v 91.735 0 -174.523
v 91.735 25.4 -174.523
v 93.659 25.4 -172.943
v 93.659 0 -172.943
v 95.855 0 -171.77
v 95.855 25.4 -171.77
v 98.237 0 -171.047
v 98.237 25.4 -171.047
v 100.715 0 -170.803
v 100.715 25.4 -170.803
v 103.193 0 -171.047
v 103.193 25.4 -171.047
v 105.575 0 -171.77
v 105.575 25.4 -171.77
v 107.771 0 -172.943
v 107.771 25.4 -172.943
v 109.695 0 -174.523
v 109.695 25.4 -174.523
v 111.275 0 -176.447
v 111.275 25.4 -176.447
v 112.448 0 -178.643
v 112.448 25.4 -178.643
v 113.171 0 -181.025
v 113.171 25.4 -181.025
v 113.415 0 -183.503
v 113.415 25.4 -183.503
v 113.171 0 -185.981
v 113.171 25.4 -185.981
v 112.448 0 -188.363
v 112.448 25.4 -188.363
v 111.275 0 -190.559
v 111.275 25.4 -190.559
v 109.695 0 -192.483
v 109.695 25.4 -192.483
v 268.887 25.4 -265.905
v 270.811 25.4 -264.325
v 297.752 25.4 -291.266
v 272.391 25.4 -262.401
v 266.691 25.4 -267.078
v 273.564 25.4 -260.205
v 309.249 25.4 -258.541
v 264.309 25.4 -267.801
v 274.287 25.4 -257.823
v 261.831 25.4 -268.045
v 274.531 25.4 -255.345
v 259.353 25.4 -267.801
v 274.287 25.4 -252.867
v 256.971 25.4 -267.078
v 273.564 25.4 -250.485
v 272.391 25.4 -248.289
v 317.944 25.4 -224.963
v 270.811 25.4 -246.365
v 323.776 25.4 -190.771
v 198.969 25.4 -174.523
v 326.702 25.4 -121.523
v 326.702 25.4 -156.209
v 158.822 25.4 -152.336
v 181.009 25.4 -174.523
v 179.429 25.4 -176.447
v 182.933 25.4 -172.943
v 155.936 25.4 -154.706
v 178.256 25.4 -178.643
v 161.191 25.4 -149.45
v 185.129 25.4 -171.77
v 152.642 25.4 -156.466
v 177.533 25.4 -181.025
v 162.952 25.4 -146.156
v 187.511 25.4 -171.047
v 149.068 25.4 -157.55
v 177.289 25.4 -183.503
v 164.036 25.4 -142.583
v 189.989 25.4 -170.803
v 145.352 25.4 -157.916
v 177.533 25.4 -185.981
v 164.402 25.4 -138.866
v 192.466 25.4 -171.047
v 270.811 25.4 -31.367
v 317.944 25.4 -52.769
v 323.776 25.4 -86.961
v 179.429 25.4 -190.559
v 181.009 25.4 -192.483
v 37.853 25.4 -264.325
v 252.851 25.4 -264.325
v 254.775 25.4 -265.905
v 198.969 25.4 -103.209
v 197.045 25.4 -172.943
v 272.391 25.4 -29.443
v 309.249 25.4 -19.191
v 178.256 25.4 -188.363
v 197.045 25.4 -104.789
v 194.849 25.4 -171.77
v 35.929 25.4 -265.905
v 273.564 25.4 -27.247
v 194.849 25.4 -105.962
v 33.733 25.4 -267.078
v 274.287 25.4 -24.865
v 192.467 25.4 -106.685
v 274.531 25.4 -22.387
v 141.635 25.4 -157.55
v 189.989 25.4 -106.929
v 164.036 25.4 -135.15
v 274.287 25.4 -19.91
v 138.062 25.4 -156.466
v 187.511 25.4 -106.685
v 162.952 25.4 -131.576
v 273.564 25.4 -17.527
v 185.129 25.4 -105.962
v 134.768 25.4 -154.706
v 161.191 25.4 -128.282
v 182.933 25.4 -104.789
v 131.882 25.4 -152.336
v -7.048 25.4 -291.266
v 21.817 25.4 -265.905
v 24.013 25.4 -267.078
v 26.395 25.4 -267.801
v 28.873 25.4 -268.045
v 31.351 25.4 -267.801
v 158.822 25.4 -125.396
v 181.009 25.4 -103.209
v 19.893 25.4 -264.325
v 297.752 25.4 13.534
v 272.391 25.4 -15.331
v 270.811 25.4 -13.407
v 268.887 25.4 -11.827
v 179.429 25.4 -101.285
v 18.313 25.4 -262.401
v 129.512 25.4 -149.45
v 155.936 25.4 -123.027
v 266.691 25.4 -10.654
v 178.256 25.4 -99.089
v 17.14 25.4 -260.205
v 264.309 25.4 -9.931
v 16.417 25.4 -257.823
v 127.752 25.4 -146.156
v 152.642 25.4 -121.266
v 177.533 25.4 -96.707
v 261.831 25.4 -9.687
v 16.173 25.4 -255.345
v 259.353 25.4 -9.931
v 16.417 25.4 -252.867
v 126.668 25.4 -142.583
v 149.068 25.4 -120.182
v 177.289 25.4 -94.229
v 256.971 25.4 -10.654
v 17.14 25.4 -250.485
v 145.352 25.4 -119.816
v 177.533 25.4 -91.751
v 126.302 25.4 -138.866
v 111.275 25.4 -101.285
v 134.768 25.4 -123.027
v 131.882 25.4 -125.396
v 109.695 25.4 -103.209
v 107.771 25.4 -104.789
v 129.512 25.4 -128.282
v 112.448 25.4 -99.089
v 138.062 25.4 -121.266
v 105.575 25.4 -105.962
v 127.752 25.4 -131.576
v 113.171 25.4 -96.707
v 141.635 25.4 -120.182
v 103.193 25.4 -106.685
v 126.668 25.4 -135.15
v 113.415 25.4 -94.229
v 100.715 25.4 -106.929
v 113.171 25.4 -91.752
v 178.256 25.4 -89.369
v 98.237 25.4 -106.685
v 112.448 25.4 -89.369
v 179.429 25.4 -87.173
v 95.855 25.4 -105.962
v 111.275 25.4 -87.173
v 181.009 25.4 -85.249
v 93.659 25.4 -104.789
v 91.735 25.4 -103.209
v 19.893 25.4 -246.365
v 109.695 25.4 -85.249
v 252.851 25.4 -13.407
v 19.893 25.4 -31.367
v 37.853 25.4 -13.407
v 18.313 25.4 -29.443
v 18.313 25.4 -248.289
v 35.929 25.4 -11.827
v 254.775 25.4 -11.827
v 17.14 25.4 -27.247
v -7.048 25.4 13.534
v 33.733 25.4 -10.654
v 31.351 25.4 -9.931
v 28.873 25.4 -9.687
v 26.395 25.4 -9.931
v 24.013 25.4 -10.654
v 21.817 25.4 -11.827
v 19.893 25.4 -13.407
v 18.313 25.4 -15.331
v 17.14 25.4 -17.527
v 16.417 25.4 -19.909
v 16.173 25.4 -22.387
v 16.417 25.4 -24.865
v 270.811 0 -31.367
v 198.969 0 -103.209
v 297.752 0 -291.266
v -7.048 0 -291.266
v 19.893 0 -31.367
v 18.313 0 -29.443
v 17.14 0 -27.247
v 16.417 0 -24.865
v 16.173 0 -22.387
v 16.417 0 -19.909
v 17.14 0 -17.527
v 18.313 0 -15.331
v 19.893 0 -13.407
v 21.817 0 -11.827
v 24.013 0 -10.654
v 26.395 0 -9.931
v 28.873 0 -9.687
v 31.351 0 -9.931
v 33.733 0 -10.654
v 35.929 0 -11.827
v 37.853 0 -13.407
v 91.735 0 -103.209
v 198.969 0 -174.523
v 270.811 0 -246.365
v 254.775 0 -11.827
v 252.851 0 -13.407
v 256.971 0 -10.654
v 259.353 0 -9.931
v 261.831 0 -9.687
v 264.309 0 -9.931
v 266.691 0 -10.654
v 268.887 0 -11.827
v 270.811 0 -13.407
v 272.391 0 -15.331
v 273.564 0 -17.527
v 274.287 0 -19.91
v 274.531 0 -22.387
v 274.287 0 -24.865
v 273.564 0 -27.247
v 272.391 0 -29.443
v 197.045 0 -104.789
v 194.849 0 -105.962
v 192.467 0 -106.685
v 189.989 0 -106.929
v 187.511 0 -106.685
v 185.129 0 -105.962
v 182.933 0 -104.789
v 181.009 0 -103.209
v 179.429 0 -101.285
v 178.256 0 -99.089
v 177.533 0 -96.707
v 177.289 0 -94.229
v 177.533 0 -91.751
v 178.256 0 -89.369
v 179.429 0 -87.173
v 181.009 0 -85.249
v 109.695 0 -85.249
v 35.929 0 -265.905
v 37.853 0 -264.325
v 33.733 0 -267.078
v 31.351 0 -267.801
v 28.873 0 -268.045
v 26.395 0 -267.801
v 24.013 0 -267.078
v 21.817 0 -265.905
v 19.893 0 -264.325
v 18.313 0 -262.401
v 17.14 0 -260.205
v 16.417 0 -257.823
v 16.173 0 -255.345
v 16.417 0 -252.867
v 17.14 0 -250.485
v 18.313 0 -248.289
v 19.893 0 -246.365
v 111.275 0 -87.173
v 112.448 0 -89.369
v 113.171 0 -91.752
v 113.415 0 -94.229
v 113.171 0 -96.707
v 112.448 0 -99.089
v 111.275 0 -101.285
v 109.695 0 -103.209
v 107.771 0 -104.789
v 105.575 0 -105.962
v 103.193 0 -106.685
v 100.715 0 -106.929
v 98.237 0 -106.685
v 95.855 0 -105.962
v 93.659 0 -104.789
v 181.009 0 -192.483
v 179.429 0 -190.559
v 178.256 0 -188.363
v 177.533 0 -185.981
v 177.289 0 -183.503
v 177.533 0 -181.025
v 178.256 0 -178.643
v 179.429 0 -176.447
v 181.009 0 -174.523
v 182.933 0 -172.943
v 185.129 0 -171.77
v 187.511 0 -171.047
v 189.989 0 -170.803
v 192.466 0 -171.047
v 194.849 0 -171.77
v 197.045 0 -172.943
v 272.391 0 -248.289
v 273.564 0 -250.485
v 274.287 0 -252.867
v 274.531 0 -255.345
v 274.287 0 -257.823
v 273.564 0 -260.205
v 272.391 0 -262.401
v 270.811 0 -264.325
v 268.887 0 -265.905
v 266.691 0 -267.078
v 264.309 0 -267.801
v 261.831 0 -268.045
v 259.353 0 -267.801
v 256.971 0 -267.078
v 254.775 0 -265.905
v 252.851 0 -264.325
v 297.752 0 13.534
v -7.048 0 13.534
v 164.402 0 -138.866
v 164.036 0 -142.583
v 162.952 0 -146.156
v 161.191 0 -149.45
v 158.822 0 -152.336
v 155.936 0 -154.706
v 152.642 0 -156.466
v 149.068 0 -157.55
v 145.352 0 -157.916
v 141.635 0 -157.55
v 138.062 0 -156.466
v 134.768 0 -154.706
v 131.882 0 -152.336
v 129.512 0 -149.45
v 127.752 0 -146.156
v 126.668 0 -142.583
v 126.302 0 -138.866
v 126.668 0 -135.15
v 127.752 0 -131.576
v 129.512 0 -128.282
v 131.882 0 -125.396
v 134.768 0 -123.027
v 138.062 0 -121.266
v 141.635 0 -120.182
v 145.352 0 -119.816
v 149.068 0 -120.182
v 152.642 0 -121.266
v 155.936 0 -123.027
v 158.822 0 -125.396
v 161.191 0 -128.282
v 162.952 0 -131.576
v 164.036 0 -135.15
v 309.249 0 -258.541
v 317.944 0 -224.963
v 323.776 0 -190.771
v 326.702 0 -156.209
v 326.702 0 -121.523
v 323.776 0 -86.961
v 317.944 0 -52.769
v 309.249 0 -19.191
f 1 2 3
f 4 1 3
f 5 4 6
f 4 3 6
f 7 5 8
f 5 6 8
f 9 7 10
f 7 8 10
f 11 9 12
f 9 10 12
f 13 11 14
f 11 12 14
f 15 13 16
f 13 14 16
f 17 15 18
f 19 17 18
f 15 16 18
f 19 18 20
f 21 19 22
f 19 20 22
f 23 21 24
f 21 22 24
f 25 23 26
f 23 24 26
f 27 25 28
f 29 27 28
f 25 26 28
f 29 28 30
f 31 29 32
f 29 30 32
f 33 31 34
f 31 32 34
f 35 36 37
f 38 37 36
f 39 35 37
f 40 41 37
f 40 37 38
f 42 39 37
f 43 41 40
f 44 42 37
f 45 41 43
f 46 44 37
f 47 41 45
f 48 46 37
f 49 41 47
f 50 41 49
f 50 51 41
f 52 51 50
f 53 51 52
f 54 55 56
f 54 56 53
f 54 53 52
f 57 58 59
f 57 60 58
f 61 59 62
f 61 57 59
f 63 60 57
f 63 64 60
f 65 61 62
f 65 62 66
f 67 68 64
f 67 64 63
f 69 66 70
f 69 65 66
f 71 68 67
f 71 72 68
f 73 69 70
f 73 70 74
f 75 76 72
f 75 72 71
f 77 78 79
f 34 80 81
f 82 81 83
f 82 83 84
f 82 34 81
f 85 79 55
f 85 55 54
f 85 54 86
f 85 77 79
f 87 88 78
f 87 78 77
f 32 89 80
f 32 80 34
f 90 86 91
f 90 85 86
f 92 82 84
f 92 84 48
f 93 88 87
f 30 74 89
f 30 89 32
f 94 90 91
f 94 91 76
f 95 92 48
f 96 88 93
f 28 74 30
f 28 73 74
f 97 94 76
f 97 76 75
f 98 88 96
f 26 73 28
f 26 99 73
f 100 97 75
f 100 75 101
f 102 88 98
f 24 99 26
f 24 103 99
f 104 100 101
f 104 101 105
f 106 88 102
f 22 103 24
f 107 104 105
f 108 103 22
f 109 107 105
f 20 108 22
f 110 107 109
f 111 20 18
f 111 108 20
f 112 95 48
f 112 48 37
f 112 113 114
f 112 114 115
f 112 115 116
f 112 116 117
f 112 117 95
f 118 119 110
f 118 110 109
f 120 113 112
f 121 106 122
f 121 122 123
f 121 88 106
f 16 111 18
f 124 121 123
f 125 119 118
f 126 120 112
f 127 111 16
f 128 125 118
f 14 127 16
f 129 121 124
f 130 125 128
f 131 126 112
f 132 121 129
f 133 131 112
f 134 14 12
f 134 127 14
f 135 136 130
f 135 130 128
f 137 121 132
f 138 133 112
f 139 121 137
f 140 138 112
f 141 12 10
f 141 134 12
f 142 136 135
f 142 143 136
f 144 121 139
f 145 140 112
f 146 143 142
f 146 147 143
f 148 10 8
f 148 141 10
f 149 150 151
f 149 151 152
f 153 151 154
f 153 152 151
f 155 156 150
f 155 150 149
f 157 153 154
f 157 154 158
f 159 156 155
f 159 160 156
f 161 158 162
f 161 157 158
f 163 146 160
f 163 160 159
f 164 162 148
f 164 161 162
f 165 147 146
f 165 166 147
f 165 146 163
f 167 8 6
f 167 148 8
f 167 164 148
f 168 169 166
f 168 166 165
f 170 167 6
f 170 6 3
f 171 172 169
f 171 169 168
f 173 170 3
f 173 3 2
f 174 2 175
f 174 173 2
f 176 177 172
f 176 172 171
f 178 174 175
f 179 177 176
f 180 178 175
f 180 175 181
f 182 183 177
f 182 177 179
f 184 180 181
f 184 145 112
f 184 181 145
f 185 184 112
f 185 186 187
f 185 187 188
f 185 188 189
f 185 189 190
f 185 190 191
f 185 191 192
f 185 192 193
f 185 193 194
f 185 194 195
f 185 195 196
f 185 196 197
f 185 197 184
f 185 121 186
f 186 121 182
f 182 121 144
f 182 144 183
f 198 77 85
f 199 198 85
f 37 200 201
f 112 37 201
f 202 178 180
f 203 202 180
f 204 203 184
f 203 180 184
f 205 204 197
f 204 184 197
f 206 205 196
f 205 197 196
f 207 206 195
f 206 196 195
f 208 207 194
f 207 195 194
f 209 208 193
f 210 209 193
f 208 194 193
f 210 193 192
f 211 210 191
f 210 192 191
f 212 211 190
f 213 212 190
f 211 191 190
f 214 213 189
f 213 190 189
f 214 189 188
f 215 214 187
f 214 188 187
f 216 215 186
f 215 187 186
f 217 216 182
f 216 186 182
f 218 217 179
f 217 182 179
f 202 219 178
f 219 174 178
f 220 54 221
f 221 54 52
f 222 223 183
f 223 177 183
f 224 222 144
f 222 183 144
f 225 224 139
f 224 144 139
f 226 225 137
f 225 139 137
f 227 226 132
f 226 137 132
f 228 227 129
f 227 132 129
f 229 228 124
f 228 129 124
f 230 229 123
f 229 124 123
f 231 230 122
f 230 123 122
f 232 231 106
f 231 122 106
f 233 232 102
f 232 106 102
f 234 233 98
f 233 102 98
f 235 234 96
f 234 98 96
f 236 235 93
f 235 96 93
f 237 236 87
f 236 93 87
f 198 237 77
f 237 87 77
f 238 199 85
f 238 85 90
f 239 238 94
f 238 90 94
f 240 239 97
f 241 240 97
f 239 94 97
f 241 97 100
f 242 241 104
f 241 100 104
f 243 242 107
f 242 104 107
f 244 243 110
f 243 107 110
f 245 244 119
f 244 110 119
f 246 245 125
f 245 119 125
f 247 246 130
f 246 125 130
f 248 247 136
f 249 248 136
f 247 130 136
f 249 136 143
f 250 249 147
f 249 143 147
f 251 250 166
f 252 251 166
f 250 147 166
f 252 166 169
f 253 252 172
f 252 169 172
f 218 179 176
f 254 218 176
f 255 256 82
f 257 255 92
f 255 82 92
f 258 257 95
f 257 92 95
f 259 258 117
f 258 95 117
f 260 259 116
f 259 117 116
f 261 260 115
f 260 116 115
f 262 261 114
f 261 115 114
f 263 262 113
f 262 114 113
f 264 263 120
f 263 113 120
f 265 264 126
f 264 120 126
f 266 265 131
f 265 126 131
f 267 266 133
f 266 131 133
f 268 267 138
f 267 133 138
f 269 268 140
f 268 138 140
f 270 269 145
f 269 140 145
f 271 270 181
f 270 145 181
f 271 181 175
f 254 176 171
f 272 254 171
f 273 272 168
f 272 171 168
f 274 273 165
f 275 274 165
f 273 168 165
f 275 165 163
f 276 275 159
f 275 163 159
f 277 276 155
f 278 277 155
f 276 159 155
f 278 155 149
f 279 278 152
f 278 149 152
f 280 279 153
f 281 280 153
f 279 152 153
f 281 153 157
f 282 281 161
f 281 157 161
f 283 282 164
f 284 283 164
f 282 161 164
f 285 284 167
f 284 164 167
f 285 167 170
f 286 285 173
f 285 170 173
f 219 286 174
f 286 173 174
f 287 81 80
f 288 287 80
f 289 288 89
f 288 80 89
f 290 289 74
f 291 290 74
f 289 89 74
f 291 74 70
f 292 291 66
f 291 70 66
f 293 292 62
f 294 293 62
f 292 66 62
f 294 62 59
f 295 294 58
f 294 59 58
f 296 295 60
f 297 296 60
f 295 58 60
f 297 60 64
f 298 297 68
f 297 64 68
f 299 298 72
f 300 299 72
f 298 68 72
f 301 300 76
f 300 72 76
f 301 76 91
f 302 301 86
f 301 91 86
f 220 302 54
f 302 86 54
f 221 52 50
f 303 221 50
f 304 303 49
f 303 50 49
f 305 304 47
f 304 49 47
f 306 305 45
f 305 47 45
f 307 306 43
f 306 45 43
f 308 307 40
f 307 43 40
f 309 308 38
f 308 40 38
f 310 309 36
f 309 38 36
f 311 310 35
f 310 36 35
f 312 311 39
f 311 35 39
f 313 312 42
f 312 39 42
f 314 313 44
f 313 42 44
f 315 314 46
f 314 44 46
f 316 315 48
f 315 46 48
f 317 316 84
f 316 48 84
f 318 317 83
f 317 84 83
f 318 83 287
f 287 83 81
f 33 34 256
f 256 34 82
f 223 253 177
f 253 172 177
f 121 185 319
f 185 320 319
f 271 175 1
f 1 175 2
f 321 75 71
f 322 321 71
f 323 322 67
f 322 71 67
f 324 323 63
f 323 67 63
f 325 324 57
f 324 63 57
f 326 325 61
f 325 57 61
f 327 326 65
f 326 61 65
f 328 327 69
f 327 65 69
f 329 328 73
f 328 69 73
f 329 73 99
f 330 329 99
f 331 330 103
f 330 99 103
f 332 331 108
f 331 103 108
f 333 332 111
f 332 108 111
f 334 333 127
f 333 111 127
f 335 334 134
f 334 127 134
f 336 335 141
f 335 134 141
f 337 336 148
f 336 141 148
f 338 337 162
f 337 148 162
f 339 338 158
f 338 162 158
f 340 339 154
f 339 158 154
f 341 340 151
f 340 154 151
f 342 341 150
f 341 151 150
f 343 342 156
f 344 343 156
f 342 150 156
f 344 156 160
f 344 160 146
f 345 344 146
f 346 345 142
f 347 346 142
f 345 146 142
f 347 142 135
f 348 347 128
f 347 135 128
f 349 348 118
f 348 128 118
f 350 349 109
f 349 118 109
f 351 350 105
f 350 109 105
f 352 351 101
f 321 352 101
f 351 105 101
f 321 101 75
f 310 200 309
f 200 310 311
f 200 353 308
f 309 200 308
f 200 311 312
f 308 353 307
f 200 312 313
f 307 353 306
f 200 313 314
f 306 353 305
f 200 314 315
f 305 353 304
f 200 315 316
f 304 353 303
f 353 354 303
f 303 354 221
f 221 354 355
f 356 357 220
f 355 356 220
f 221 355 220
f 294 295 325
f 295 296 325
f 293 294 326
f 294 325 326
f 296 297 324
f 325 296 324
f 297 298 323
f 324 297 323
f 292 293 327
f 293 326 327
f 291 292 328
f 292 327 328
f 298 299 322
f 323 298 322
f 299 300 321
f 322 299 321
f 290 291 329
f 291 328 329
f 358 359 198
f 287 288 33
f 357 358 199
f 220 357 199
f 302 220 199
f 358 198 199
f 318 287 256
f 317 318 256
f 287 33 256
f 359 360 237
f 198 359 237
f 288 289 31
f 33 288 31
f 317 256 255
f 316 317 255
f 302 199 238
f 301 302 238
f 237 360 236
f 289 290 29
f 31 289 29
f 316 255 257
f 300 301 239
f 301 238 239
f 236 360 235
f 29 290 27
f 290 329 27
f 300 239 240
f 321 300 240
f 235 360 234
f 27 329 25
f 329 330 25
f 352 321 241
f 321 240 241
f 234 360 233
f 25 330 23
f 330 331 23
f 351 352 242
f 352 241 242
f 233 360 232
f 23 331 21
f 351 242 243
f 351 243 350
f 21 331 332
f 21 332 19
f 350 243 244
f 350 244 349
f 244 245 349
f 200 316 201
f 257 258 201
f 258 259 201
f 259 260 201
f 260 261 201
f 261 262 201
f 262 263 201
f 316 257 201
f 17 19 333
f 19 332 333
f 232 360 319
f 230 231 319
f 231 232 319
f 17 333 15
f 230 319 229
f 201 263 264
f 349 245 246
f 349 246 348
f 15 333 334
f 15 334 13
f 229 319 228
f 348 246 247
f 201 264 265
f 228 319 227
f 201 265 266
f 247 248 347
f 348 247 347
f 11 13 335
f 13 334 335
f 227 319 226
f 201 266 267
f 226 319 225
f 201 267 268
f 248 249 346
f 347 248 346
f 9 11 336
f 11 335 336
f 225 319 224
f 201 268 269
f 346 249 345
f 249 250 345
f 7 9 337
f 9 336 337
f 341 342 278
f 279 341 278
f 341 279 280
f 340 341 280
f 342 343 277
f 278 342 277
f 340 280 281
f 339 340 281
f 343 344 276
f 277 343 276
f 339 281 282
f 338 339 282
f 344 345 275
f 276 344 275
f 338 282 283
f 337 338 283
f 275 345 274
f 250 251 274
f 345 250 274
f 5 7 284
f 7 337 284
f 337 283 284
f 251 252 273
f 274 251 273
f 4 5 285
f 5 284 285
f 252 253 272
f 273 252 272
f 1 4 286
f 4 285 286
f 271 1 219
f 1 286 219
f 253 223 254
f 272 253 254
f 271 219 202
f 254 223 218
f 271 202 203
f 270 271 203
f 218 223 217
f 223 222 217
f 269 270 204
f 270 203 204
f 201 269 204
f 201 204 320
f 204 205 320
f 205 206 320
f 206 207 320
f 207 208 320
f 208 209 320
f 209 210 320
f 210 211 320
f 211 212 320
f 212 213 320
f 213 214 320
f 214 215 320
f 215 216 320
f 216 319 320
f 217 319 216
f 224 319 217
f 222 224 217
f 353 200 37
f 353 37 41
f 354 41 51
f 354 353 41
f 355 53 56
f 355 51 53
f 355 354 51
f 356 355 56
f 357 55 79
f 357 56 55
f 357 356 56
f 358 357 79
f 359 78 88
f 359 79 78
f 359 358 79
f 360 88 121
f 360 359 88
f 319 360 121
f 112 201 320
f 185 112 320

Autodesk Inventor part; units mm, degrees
ref_plane "YZ Plane" through (0, 0, 0) normal (1, 0, 0) x (0, 1, 0)
ref_plane "XZ Plane" through (0, 0, 0) normal (0, 1, 0) x (-1, 0, 0)
ref_plane "XY Plane" through (0, 0, 0) normal (0, 0, 1) x (1, 0, 0)
sketch "Sketch1" plane through (0, 0, 0) normal (0, 1, 0) x (-1, 0, 0)
  line L0 (7.0481, 13.5339) -> (-297.7519, 13.5339)
  line L1 (-297.7519, 13.5339) -> (-297.7519, -291.2661)
  line L2 (-297.7519, -291.2661) -> (7.0481, -291.2661)
  line L3 (7.0481, -291.2661) -> (7.0481, 13.5339)
  arc A0 (-297.7519, 13.5339) -> (-297.7519, -291.2661) centre (83.7145, -138.8661) ccw
  point P0 (0, 0)
  dimension "d0" = 304.8
  dimension "d1" = 304.8
extrude "Extrusion1" add sketch "Sketch1" along normal blind 25.4
sketch "Sketch2" plane through (0, 25.4, 0) normal (0, 1, 0) x (1, 0, 0)
  line L0 (-7.0481, 291.2661) -> (-7.0481, -13.5339) projected
  line L1 (-7.0481, 138.8661) -> (145.3519, 138.8661)
  circle A0 centre (145.3519, 138.8661) radius 19.05
  point P0 (0, 0)
  dimension "d4" = 152.4
  dimension "d5" = 38.1
extrude "Extrusion2" cut sketch "Sketch2" against normal blind 50.8
sketch "Sketch3" plane through (0, 25.4, 0) normal (0, 1, 0) x (1, 0, 0)
  line L0 (-7.0481, 291.2661) -> (-7.0481, -13.5339) projected
  line L1 (297.7519, 291.2661) -> (-7.0481, 291.2661) projected
  line L2 (-7.0481, -13.5339) -> (297.7519, 291.2661)
  line L3 (-7.0481, -13.5339) -> (297.7519, -13.5339) projected
  line L4 (-7.0481, 291.2661) -> (297.7519, -13.5339)
  line L5 (-7.0481, -13.5339) -> (28.873, 22.3871)
  line L6 (297.7519, -13.5339) -> (261.8309, 22.3871)
  line L7 (297.7519, 291.2661) -> (261.8309, 255.3451)
  line L8 (-7.0481, 291.2661) -> (28.873, 255.3451)
  line L9 (28.873, 22.3871) -> (261.8309, 22.3871)
  line L10 (261.8309, 22.3871) -> (261.8309, 255.3451)
  line L11 (261.8309, 255.3451) -> (28.873, 255.3451)
  line L12 (28.873, 255.3451) -> (28.873, 22.3871)
  line L13 (28.873, 22.3871) -> (100.715, 94.2292) construction
  line L14 (37.8532, 13.4068) -> (109.6953, 85.2489)
  line L15 (91.7348, 103.2094) -> (19.8927, 31.3674)
  arc A0 (19.8927, 31.3674) -> (37.8532, 13.4068) centre (28.873, 22.3871) ccw
  arc A1 (109.6953, 85.2489) -> (91.7348, 103.2094) centre (100.715, 94.2292) ccw
  line L16 (28.873, 255.3451) -> (100.715, 183.503) construction
  line L17 (19.8927, 246.3648) -> (91.7348, 174.5228)
  line L18 (109.6953, 192.4833) -> (37.8532, 264.3253)
  arc A2 (37.8532, 264.3253) -> (19.8927, 246.3648) centre (28.873, 255.3451) ccw
  arc A3 (91.7348, 174.5228) -> (109.6953, 192.4833) centre (100.715, 183.503) ccw
  line L19 (261.8309, 22.3871) -> (189.9889, 94.2292) construction
  line L20 (270.8112, 31.3674) -> (198.9691, 103.2094)
  line L21 (181.0086, 85.2489) -> (252.8507, 13.4068)
  arc A4 (252.8507, 13.4068) -> (270.8112, 31.3674) centre (261.8309, 22.3871) ccw
  arc A5 (198.9691, 103.2094) -> (181.0086, 85.2489) centre (189.9889, 94.2292) ccw
  line L22 (261.8309, 255.3451) -> (189.9889, 183.503) construction
  line L23 (252.8507, 264.3253) -> (181.0086, 192.4833)
  line L24 (198.9691, 174.5228) -> (270.8112, 246.3648)
  arc A6 (270.8112, 246.3648) -> (252.8507, 264.3253) centre (261.8309, 255.3451) ccw
  arc A7 (181.0086, 192.4833) -> (198.9691, 174.5228) centre (189.9889, 183.503) ccw
  point P0 (0, 0)
  point P1 (64.794, 58.3081)
  point P2 (64.794, 219.424)
  point P3 (225.9099, 58.3081)
  point P4 (225.9099, 219.424)
  dimension "d8" = 50.8
  dimension "d9" = 50.8
  dimension "d10" = 50.8
  dimension "d11" = 50.8
  dimension "d12" = 101.6
  dimension "d13" = 25.4
  dimension "d14" = 101.6
  dimension "d15" = 25.4
  dimension "d16" = 101.6
  dimension "d17" = 25.4
  dimension "d18" = 101.6
  dimension "d19" = 25.4
extrude "Extrusion3" cut sketch "Sketch3" against normal blind 50.8 contours A2 L18 L11 L4 | L4 L12 L17 A2 | A0 L15 L12 L2 | L2 L9 L14 A0 | A6 L24 L10 L2 | L2 L11 L23 A6 | L11 L18 A3 L4 | L4 A3 L17 L12 | L12 L15 A1 L2 | L2 A1 L14 L9 | A4 L21 L9 L4 | L4 L10 L20 A4 | L10 L24 A7 L2 | L2 A7 L23 L11 | L9 L21 A5 L4 | L4 A5 L20 L10
properties part number "Shoddy Drilling Platform Representation"
